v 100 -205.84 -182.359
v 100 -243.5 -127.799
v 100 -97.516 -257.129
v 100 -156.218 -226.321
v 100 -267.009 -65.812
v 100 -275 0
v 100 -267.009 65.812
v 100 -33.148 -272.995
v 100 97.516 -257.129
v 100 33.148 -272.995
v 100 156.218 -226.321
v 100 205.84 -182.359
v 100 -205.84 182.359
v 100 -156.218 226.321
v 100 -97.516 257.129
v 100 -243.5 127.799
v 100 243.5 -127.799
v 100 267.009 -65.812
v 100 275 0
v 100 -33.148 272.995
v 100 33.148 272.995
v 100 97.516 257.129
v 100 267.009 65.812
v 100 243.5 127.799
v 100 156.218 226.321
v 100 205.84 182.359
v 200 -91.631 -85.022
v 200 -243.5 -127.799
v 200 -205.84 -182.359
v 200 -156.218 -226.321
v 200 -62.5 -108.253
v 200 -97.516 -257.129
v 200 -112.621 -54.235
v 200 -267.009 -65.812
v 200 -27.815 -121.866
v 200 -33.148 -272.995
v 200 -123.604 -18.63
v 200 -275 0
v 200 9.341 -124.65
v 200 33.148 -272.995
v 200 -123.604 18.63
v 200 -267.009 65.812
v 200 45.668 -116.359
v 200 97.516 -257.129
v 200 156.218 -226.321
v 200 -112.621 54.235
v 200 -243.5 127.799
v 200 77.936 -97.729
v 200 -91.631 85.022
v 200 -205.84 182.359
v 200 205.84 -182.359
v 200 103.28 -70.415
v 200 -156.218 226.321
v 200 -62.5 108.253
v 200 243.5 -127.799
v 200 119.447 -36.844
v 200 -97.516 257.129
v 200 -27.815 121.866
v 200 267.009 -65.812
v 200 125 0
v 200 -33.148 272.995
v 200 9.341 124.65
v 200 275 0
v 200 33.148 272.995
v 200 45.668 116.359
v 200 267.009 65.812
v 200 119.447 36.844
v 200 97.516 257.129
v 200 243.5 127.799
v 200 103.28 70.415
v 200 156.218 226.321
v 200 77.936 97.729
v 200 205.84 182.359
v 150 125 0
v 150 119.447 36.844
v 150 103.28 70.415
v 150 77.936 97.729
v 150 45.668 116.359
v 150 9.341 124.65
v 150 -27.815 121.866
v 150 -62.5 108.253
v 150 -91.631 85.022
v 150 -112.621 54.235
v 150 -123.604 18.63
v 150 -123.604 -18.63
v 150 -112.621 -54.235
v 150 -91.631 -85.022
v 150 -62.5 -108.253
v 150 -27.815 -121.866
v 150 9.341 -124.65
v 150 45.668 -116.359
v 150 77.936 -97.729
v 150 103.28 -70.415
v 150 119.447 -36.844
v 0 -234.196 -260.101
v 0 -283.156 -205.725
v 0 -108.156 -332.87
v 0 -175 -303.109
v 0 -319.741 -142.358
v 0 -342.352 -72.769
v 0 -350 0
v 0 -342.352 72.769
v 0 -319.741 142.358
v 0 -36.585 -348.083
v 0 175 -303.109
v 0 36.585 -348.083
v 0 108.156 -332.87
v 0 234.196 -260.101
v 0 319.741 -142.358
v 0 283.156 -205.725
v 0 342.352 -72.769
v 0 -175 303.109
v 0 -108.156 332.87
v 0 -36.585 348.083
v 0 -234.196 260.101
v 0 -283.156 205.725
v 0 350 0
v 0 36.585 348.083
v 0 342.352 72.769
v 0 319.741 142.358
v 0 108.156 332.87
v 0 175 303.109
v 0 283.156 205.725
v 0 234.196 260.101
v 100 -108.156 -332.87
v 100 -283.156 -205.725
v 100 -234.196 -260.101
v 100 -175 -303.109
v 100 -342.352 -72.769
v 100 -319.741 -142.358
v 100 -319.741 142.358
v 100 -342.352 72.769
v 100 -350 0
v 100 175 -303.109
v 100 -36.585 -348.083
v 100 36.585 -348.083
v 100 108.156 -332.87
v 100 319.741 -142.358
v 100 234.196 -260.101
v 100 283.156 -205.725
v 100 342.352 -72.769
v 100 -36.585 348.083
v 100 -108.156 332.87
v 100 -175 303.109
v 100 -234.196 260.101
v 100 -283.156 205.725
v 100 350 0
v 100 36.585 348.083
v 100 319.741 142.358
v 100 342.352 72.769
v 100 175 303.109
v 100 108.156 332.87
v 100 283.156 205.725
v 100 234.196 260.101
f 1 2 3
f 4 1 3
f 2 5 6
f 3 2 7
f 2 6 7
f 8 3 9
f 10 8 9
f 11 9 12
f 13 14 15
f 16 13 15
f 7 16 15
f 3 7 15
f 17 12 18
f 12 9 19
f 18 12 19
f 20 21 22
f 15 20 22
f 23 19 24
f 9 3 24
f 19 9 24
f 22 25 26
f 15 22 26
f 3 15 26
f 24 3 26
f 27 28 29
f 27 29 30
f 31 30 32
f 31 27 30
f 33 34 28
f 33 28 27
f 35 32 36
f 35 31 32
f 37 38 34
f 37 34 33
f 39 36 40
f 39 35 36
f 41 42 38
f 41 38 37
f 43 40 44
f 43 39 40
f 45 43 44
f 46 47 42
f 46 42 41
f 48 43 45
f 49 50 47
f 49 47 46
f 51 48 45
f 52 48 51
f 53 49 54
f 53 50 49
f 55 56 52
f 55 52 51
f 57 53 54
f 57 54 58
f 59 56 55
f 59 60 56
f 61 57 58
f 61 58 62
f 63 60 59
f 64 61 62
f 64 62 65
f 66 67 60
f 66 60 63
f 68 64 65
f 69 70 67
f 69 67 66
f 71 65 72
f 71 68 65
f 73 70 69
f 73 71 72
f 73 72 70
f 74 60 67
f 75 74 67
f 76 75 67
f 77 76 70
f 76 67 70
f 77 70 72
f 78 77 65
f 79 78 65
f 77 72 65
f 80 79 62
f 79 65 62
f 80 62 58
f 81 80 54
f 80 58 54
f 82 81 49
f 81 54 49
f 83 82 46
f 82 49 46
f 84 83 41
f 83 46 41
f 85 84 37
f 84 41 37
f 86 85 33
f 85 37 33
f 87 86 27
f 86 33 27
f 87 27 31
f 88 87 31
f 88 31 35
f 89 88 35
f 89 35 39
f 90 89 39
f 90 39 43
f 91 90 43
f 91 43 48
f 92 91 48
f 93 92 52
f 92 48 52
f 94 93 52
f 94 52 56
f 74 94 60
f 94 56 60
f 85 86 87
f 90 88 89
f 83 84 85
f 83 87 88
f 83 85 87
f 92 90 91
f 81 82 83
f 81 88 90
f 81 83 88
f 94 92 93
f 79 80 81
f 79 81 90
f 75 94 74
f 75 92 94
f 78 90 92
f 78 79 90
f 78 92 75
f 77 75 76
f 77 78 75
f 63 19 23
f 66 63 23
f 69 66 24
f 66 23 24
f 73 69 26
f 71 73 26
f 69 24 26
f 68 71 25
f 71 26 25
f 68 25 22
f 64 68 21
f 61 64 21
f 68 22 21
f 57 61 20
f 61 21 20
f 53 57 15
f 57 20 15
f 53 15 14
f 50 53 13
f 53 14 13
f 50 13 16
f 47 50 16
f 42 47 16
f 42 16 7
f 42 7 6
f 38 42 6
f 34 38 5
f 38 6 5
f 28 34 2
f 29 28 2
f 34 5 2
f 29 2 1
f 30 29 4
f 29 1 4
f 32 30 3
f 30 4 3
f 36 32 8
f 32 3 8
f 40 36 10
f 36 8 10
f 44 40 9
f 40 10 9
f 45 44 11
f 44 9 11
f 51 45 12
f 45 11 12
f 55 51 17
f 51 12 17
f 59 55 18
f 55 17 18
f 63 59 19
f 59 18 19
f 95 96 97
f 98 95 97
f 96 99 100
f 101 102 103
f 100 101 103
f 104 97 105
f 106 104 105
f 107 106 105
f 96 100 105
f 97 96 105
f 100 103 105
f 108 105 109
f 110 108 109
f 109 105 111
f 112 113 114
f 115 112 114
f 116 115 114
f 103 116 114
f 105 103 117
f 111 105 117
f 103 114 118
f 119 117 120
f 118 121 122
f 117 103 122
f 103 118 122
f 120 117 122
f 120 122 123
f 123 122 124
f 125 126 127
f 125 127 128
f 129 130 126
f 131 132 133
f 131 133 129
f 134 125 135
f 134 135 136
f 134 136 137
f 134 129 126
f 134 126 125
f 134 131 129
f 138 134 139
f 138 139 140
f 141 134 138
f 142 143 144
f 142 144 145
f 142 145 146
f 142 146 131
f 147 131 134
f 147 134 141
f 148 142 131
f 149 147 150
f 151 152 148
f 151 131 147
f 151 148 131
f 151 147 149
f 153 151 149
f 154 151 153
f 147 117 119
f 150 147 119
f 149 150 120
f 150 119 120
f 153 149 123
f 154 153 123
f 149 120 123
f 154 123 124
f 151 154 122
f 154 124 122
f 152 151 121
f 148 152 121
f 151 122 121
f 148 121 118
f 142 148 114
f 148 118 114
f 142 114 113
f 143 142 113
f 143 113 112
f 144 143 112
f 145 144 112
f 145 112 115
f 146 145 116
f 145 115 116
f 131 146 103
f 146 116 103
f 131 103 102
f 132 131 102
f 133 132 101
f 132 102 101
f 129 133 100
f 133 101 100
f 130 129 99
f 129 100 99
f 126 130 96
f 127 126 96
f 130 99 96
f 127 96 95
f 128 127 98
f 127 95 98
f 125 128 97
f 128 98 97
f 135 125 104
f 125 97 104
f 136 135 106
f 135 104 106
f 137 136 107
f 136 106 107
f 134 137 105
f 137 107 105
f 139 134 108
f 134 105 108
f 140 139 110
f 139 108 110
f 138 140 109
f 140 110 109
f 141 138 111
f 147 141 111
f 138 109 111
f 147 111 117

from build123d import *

# Parameters (mm, degrees)
F0_R     = 350
F1_DEPTH = 100
F2_R     = 275
F3_DEPTH = 100
F4_R     = 125
F5_DEPTH = 50


with BuildPart() as f1:
    # F0 (on Right) → F1 (new body)
    with BuildSketch(Plane.YZ):
        Circle(F0_R)
    extrude(amount=F1_DEPTH)


with BuildPart() as f3:
    # F2 (on face) → F3 (new body)
    with BuildSketch(Plane.YZ.offset(100)):
        Circle(F2_R)
    extrude(amount=F3_DEPTH)

    # F4 (on face) → F5 (cut)
    with BuildSketch(Plane.YZ.offset(200)):
        Circle(F4_R)
    extrude(amount=-F5_DEPTH, mode=Mode.SUBTRACT)


solid = Compound([f1.part, f3.part])
